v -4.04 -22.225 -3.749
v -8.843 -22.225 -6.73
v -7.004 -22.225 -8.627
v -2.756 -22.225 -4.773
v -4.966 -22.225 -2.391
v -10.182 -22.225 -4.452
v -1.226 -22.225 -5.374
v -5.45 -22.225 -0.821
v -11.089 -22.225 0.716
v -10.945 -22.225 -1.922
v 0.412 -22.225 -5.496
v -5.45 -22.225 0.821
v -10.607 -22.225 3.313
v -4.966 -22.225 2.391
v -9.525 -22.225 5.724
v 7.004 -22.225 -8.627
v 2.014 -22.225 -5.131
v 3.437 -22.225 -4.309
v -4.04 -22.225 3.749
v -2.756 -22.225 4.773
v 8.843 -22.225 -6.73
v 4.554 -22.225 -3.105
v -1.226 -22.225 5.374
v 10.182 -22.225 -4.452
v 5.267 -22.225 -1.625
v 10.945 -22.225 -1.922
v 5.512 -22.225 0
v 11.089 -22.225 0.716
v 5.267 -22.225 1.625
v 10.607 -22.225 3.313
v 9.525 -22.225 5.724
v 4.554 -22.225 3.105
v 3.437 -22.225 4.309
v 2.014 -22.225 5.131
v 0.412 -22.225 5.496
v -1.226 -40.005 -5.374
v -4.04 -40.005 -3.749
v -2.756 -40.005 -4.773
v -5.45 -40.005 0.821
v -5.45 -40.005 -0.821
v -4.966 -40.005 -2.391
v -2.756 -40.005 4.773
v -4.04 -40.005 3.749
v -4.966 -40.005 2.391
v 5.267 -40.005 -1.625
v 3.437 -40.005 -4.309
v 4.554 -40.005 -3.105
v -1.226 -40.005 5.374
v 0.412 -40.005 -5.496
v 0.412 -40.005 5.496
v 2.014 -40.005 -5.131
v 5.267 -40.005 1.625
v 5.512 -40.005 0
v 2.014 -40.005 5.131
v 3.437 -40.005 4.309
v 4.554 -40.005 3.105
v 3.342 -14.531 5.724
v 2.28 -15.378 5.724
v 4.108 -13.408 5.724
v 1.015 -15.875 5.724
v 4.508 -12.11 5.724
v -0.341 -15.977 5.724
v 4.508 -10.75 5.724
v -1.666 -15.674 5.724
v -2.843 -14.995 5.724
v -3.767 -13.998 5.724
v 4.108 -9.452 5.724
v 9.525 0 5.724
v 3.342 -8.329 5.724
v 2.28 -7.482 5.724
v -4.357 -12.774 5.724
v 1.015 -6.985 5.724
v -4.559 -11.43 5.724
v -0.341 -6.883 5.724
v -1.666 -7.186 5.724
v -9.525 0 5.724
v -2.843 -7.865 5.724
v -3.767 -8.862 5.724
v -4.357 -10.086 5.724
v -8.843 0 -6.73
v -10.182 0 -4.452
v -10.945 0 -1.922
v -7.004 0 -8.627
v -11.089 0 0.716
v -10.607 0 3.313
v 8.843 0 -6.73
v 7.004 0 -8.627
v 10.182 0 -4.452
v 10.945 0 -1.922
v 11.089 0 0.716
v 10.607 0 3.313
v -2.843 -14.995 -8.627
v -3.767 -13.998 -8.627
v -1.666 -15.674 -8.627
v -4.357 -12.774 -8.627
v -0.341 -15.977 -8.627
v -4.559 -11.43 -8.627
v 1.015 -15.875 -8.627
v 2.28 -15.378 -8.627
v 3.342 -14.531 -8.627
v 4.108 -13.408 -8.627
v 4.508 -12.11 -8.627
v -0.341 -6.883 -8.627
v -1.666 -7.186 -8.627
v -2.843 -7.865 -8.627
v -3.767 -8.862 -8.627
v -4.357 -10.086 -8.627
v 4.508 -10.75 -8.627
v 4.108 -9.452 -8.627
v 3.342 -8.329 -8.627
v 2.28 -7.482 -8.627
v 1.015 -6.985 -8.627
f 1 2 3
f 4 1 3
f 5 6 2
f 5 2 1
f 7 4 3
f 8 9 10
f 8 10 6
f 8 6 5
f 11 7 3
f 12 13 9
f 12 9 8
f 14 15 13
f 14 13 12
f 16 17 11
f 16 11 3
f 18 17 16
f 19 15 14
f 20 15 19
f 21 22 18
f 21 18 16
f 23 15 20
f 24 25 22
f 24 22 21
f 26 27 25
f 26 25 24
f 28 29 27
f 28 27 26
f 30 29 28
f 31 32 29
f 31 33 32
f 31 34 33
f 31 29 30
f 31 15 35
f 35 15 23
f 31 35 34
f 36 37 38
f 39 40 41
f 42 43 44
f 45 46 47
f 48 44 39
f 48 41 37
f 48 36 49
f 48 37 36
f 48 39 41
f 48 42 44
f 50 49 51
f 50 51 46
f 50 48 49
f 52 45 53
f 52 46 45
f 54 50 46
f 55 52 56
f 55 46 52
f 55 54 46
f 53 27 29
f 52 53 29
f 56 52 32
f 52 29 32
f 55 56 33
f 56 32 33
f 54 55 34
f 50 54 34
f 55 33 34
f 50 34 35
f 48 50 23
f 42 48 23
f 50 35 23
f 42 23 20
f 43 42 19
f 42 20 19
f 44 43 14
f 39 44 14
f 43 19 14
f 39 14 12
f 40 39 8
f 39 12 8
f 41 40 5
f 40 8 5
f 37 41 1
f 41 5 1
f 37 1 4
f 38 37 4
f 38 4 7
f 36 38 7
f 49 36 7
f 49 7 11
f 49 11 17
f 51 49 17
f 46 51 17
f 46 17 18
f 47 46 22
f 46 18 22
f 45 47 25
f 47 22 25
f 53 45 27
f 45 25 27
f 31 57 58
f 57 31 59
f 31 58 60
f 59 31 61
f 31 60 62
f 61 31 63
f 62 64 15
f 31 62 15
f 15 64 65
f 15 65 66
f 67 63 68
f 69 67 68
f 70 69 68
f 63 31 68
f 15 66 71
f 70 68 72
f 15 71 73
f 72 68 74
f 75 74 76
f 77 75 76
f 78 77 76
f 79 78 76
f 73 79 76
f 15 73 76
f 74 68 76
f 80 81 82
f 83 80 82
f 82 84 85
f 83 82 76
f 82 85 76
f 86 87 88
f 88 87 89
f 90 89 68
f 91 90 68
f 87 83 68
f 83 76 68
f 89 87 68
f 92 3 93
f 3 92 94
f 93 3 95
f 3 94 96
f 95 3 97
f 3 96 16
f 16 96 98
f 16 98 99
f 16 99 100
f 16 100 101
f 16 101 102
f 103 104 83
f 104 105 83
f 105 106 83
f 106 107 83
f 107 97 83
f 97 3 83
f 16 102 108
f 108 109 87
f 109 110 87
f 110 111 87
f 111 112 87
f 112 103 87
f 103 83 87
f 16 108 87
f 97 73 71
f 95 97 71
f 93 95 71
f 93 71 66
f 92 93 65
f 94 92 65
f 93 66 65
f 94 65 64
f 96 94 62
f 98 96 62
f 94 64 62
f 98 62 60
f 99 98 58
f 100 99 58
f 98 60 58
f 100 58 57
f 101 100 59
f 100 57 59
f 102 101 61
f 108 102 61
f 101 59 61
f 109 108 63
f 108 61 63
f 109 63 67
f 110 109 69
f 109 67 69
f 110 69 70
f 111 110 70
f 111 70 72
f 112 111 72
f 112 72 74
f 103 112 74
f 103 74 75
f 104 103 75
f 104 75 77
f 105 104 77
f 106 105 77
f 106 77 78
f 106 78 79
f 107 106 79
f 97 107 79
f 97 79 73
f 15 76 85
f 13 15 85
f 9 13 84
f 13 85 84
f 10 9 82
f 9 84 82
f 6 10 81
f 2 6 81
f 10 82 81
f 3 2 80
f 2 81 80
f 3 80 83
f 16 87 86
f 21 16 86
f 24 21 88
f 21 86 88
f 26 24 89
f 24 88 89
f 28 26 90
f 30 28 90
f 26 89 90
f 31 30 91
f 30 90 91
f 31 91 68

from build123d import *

# Parameters (mm, degrees)
F1_DEPTH = 22.225
F2_R     = 5.5118
F3_DEPTH = 17.78
F5_D     = 9.1186


# Not quite as in the source:
# - ends of sketch curves that miss each other by under 0.0002 mm in the source are joined


with BuildPart() as f1:
    # F0 (on Front) → F1 (new body)
    with BuildSketch(Plane.XZ):
        with BuildLine():
            ThreePointArc((7.0042338121, -8.6271875461), (10.9449391879, -1.9224886016), (9.5250001177, 5.7238124539))
            Line((9.5250001177, 5.7238124539), (-9.5250001177, 5.7238124539))
            ThreePointArc((-9.5250001177, 5.7238124539), (-10.9449391879, -1.9224886016), (-7.0042338121, -8.6271875461))
            Line((-7.0042338121, -8.6271875461), (7.0042338121, -8.6271875461))
        make_face()
    extrude(amount=F1_DEPTH)

    # F2 (on face) → F3 (join)
    with BuildSketch(Plane.XZ.offset(22.225)):
        Circle(F2_R)
    extrude(amount=F3_DEPTH)

    # F5 (through all)
    with Locations(Plane(origin=(0, 0, -8.6271875461), x_dir=(1, 0, 0), z_dir=(0, 0, -1))):
        with Locations((0, 11.43)):
            Hole(F5_D / 2)


solid = f1.part
